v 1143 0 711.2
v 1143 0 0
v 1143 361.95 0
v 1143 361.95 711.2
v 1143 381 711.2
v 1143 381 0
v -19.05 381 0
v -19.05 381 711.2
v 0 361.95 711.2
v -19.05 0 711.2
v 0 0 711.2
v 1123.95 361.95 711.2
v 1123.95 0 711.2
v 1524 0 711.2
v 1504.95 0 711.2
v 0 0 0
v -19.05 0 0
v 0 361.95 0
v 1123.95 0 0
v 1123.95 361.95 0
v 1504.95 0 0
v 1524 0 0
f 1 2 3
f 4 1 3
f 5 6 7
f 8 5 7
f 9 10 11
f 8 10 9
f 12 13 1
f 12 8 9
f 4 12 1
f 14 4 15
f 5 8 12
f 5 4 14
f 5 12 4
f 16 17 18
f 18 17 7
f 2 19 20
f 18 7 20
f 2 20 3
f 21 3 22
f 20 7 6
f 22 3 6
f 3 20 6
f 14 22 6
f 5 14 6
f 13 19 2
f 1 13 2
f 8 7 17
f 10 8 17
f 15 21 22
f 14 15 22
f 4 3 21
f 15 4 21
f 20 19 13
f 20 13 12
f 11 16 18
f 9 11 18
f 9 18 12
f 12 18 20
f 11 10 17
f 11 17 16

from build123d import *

# Parameters (mm, degrees)
F0_W     = 19.05
F0_H     = 361.95
F1_DEPTH = 711.2


with BuildPart() as f1:
    # F0 (on Top) → F1 (new body)
    with BuildSketch(Plane.XY):
        Polygon((0, 381), (-19.05, 381), (-19.05, 0), (0, 0), (0, 361.95), align=None)
        Polygon((1143, 381), (0, 381), (0, 361.95), (1123.95, 361.95), (1143, 361.95), align=None)
        with Locations((1133.475, 180.975)):
            Rectangle(F0_W, F0_H)
        Polygon((1524, 0), (1143, 381), (1143, 361.95), (1504.95, 0), align=None)
    extrude(amount=F1_DEPTH)


solid = f1.part
